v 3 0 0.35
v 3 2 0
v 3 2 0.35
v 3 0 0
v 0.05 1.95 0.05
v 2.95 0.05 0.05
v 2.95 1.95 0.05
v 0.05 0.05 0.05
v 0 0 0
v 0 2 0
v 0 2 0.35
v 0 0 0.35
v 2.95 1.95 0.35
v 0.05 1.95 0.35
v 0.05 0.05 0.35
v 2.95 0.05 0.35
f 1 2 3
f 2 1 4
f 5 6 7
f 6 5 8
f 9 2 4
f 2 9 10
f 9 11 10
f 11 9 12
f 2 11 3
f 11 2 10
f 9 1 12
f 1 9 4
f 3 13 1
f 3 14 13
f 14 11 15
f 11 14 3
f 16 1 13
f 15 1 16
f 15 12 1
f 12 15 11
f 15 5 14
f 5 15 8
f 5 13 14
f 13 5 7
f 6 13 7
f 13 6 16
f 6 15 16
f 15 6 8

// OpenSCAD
cube([3,2,0.05]);//podstava

side = [[0,0],[3,0],[3,2],[0,2]];//bok
fill = [[0.05,0.05],[2.95,0.05],[2.95,1.95],[0.05,1.95]];//vypln

translate([0,0,0.05]) {// okraj
    linear_extrude(height=0.3) {// vyska boku
        polygon(concat(side,fill),paths=[[0,1,2,3],[4,5,6,7]]);// polygon
    }
}
